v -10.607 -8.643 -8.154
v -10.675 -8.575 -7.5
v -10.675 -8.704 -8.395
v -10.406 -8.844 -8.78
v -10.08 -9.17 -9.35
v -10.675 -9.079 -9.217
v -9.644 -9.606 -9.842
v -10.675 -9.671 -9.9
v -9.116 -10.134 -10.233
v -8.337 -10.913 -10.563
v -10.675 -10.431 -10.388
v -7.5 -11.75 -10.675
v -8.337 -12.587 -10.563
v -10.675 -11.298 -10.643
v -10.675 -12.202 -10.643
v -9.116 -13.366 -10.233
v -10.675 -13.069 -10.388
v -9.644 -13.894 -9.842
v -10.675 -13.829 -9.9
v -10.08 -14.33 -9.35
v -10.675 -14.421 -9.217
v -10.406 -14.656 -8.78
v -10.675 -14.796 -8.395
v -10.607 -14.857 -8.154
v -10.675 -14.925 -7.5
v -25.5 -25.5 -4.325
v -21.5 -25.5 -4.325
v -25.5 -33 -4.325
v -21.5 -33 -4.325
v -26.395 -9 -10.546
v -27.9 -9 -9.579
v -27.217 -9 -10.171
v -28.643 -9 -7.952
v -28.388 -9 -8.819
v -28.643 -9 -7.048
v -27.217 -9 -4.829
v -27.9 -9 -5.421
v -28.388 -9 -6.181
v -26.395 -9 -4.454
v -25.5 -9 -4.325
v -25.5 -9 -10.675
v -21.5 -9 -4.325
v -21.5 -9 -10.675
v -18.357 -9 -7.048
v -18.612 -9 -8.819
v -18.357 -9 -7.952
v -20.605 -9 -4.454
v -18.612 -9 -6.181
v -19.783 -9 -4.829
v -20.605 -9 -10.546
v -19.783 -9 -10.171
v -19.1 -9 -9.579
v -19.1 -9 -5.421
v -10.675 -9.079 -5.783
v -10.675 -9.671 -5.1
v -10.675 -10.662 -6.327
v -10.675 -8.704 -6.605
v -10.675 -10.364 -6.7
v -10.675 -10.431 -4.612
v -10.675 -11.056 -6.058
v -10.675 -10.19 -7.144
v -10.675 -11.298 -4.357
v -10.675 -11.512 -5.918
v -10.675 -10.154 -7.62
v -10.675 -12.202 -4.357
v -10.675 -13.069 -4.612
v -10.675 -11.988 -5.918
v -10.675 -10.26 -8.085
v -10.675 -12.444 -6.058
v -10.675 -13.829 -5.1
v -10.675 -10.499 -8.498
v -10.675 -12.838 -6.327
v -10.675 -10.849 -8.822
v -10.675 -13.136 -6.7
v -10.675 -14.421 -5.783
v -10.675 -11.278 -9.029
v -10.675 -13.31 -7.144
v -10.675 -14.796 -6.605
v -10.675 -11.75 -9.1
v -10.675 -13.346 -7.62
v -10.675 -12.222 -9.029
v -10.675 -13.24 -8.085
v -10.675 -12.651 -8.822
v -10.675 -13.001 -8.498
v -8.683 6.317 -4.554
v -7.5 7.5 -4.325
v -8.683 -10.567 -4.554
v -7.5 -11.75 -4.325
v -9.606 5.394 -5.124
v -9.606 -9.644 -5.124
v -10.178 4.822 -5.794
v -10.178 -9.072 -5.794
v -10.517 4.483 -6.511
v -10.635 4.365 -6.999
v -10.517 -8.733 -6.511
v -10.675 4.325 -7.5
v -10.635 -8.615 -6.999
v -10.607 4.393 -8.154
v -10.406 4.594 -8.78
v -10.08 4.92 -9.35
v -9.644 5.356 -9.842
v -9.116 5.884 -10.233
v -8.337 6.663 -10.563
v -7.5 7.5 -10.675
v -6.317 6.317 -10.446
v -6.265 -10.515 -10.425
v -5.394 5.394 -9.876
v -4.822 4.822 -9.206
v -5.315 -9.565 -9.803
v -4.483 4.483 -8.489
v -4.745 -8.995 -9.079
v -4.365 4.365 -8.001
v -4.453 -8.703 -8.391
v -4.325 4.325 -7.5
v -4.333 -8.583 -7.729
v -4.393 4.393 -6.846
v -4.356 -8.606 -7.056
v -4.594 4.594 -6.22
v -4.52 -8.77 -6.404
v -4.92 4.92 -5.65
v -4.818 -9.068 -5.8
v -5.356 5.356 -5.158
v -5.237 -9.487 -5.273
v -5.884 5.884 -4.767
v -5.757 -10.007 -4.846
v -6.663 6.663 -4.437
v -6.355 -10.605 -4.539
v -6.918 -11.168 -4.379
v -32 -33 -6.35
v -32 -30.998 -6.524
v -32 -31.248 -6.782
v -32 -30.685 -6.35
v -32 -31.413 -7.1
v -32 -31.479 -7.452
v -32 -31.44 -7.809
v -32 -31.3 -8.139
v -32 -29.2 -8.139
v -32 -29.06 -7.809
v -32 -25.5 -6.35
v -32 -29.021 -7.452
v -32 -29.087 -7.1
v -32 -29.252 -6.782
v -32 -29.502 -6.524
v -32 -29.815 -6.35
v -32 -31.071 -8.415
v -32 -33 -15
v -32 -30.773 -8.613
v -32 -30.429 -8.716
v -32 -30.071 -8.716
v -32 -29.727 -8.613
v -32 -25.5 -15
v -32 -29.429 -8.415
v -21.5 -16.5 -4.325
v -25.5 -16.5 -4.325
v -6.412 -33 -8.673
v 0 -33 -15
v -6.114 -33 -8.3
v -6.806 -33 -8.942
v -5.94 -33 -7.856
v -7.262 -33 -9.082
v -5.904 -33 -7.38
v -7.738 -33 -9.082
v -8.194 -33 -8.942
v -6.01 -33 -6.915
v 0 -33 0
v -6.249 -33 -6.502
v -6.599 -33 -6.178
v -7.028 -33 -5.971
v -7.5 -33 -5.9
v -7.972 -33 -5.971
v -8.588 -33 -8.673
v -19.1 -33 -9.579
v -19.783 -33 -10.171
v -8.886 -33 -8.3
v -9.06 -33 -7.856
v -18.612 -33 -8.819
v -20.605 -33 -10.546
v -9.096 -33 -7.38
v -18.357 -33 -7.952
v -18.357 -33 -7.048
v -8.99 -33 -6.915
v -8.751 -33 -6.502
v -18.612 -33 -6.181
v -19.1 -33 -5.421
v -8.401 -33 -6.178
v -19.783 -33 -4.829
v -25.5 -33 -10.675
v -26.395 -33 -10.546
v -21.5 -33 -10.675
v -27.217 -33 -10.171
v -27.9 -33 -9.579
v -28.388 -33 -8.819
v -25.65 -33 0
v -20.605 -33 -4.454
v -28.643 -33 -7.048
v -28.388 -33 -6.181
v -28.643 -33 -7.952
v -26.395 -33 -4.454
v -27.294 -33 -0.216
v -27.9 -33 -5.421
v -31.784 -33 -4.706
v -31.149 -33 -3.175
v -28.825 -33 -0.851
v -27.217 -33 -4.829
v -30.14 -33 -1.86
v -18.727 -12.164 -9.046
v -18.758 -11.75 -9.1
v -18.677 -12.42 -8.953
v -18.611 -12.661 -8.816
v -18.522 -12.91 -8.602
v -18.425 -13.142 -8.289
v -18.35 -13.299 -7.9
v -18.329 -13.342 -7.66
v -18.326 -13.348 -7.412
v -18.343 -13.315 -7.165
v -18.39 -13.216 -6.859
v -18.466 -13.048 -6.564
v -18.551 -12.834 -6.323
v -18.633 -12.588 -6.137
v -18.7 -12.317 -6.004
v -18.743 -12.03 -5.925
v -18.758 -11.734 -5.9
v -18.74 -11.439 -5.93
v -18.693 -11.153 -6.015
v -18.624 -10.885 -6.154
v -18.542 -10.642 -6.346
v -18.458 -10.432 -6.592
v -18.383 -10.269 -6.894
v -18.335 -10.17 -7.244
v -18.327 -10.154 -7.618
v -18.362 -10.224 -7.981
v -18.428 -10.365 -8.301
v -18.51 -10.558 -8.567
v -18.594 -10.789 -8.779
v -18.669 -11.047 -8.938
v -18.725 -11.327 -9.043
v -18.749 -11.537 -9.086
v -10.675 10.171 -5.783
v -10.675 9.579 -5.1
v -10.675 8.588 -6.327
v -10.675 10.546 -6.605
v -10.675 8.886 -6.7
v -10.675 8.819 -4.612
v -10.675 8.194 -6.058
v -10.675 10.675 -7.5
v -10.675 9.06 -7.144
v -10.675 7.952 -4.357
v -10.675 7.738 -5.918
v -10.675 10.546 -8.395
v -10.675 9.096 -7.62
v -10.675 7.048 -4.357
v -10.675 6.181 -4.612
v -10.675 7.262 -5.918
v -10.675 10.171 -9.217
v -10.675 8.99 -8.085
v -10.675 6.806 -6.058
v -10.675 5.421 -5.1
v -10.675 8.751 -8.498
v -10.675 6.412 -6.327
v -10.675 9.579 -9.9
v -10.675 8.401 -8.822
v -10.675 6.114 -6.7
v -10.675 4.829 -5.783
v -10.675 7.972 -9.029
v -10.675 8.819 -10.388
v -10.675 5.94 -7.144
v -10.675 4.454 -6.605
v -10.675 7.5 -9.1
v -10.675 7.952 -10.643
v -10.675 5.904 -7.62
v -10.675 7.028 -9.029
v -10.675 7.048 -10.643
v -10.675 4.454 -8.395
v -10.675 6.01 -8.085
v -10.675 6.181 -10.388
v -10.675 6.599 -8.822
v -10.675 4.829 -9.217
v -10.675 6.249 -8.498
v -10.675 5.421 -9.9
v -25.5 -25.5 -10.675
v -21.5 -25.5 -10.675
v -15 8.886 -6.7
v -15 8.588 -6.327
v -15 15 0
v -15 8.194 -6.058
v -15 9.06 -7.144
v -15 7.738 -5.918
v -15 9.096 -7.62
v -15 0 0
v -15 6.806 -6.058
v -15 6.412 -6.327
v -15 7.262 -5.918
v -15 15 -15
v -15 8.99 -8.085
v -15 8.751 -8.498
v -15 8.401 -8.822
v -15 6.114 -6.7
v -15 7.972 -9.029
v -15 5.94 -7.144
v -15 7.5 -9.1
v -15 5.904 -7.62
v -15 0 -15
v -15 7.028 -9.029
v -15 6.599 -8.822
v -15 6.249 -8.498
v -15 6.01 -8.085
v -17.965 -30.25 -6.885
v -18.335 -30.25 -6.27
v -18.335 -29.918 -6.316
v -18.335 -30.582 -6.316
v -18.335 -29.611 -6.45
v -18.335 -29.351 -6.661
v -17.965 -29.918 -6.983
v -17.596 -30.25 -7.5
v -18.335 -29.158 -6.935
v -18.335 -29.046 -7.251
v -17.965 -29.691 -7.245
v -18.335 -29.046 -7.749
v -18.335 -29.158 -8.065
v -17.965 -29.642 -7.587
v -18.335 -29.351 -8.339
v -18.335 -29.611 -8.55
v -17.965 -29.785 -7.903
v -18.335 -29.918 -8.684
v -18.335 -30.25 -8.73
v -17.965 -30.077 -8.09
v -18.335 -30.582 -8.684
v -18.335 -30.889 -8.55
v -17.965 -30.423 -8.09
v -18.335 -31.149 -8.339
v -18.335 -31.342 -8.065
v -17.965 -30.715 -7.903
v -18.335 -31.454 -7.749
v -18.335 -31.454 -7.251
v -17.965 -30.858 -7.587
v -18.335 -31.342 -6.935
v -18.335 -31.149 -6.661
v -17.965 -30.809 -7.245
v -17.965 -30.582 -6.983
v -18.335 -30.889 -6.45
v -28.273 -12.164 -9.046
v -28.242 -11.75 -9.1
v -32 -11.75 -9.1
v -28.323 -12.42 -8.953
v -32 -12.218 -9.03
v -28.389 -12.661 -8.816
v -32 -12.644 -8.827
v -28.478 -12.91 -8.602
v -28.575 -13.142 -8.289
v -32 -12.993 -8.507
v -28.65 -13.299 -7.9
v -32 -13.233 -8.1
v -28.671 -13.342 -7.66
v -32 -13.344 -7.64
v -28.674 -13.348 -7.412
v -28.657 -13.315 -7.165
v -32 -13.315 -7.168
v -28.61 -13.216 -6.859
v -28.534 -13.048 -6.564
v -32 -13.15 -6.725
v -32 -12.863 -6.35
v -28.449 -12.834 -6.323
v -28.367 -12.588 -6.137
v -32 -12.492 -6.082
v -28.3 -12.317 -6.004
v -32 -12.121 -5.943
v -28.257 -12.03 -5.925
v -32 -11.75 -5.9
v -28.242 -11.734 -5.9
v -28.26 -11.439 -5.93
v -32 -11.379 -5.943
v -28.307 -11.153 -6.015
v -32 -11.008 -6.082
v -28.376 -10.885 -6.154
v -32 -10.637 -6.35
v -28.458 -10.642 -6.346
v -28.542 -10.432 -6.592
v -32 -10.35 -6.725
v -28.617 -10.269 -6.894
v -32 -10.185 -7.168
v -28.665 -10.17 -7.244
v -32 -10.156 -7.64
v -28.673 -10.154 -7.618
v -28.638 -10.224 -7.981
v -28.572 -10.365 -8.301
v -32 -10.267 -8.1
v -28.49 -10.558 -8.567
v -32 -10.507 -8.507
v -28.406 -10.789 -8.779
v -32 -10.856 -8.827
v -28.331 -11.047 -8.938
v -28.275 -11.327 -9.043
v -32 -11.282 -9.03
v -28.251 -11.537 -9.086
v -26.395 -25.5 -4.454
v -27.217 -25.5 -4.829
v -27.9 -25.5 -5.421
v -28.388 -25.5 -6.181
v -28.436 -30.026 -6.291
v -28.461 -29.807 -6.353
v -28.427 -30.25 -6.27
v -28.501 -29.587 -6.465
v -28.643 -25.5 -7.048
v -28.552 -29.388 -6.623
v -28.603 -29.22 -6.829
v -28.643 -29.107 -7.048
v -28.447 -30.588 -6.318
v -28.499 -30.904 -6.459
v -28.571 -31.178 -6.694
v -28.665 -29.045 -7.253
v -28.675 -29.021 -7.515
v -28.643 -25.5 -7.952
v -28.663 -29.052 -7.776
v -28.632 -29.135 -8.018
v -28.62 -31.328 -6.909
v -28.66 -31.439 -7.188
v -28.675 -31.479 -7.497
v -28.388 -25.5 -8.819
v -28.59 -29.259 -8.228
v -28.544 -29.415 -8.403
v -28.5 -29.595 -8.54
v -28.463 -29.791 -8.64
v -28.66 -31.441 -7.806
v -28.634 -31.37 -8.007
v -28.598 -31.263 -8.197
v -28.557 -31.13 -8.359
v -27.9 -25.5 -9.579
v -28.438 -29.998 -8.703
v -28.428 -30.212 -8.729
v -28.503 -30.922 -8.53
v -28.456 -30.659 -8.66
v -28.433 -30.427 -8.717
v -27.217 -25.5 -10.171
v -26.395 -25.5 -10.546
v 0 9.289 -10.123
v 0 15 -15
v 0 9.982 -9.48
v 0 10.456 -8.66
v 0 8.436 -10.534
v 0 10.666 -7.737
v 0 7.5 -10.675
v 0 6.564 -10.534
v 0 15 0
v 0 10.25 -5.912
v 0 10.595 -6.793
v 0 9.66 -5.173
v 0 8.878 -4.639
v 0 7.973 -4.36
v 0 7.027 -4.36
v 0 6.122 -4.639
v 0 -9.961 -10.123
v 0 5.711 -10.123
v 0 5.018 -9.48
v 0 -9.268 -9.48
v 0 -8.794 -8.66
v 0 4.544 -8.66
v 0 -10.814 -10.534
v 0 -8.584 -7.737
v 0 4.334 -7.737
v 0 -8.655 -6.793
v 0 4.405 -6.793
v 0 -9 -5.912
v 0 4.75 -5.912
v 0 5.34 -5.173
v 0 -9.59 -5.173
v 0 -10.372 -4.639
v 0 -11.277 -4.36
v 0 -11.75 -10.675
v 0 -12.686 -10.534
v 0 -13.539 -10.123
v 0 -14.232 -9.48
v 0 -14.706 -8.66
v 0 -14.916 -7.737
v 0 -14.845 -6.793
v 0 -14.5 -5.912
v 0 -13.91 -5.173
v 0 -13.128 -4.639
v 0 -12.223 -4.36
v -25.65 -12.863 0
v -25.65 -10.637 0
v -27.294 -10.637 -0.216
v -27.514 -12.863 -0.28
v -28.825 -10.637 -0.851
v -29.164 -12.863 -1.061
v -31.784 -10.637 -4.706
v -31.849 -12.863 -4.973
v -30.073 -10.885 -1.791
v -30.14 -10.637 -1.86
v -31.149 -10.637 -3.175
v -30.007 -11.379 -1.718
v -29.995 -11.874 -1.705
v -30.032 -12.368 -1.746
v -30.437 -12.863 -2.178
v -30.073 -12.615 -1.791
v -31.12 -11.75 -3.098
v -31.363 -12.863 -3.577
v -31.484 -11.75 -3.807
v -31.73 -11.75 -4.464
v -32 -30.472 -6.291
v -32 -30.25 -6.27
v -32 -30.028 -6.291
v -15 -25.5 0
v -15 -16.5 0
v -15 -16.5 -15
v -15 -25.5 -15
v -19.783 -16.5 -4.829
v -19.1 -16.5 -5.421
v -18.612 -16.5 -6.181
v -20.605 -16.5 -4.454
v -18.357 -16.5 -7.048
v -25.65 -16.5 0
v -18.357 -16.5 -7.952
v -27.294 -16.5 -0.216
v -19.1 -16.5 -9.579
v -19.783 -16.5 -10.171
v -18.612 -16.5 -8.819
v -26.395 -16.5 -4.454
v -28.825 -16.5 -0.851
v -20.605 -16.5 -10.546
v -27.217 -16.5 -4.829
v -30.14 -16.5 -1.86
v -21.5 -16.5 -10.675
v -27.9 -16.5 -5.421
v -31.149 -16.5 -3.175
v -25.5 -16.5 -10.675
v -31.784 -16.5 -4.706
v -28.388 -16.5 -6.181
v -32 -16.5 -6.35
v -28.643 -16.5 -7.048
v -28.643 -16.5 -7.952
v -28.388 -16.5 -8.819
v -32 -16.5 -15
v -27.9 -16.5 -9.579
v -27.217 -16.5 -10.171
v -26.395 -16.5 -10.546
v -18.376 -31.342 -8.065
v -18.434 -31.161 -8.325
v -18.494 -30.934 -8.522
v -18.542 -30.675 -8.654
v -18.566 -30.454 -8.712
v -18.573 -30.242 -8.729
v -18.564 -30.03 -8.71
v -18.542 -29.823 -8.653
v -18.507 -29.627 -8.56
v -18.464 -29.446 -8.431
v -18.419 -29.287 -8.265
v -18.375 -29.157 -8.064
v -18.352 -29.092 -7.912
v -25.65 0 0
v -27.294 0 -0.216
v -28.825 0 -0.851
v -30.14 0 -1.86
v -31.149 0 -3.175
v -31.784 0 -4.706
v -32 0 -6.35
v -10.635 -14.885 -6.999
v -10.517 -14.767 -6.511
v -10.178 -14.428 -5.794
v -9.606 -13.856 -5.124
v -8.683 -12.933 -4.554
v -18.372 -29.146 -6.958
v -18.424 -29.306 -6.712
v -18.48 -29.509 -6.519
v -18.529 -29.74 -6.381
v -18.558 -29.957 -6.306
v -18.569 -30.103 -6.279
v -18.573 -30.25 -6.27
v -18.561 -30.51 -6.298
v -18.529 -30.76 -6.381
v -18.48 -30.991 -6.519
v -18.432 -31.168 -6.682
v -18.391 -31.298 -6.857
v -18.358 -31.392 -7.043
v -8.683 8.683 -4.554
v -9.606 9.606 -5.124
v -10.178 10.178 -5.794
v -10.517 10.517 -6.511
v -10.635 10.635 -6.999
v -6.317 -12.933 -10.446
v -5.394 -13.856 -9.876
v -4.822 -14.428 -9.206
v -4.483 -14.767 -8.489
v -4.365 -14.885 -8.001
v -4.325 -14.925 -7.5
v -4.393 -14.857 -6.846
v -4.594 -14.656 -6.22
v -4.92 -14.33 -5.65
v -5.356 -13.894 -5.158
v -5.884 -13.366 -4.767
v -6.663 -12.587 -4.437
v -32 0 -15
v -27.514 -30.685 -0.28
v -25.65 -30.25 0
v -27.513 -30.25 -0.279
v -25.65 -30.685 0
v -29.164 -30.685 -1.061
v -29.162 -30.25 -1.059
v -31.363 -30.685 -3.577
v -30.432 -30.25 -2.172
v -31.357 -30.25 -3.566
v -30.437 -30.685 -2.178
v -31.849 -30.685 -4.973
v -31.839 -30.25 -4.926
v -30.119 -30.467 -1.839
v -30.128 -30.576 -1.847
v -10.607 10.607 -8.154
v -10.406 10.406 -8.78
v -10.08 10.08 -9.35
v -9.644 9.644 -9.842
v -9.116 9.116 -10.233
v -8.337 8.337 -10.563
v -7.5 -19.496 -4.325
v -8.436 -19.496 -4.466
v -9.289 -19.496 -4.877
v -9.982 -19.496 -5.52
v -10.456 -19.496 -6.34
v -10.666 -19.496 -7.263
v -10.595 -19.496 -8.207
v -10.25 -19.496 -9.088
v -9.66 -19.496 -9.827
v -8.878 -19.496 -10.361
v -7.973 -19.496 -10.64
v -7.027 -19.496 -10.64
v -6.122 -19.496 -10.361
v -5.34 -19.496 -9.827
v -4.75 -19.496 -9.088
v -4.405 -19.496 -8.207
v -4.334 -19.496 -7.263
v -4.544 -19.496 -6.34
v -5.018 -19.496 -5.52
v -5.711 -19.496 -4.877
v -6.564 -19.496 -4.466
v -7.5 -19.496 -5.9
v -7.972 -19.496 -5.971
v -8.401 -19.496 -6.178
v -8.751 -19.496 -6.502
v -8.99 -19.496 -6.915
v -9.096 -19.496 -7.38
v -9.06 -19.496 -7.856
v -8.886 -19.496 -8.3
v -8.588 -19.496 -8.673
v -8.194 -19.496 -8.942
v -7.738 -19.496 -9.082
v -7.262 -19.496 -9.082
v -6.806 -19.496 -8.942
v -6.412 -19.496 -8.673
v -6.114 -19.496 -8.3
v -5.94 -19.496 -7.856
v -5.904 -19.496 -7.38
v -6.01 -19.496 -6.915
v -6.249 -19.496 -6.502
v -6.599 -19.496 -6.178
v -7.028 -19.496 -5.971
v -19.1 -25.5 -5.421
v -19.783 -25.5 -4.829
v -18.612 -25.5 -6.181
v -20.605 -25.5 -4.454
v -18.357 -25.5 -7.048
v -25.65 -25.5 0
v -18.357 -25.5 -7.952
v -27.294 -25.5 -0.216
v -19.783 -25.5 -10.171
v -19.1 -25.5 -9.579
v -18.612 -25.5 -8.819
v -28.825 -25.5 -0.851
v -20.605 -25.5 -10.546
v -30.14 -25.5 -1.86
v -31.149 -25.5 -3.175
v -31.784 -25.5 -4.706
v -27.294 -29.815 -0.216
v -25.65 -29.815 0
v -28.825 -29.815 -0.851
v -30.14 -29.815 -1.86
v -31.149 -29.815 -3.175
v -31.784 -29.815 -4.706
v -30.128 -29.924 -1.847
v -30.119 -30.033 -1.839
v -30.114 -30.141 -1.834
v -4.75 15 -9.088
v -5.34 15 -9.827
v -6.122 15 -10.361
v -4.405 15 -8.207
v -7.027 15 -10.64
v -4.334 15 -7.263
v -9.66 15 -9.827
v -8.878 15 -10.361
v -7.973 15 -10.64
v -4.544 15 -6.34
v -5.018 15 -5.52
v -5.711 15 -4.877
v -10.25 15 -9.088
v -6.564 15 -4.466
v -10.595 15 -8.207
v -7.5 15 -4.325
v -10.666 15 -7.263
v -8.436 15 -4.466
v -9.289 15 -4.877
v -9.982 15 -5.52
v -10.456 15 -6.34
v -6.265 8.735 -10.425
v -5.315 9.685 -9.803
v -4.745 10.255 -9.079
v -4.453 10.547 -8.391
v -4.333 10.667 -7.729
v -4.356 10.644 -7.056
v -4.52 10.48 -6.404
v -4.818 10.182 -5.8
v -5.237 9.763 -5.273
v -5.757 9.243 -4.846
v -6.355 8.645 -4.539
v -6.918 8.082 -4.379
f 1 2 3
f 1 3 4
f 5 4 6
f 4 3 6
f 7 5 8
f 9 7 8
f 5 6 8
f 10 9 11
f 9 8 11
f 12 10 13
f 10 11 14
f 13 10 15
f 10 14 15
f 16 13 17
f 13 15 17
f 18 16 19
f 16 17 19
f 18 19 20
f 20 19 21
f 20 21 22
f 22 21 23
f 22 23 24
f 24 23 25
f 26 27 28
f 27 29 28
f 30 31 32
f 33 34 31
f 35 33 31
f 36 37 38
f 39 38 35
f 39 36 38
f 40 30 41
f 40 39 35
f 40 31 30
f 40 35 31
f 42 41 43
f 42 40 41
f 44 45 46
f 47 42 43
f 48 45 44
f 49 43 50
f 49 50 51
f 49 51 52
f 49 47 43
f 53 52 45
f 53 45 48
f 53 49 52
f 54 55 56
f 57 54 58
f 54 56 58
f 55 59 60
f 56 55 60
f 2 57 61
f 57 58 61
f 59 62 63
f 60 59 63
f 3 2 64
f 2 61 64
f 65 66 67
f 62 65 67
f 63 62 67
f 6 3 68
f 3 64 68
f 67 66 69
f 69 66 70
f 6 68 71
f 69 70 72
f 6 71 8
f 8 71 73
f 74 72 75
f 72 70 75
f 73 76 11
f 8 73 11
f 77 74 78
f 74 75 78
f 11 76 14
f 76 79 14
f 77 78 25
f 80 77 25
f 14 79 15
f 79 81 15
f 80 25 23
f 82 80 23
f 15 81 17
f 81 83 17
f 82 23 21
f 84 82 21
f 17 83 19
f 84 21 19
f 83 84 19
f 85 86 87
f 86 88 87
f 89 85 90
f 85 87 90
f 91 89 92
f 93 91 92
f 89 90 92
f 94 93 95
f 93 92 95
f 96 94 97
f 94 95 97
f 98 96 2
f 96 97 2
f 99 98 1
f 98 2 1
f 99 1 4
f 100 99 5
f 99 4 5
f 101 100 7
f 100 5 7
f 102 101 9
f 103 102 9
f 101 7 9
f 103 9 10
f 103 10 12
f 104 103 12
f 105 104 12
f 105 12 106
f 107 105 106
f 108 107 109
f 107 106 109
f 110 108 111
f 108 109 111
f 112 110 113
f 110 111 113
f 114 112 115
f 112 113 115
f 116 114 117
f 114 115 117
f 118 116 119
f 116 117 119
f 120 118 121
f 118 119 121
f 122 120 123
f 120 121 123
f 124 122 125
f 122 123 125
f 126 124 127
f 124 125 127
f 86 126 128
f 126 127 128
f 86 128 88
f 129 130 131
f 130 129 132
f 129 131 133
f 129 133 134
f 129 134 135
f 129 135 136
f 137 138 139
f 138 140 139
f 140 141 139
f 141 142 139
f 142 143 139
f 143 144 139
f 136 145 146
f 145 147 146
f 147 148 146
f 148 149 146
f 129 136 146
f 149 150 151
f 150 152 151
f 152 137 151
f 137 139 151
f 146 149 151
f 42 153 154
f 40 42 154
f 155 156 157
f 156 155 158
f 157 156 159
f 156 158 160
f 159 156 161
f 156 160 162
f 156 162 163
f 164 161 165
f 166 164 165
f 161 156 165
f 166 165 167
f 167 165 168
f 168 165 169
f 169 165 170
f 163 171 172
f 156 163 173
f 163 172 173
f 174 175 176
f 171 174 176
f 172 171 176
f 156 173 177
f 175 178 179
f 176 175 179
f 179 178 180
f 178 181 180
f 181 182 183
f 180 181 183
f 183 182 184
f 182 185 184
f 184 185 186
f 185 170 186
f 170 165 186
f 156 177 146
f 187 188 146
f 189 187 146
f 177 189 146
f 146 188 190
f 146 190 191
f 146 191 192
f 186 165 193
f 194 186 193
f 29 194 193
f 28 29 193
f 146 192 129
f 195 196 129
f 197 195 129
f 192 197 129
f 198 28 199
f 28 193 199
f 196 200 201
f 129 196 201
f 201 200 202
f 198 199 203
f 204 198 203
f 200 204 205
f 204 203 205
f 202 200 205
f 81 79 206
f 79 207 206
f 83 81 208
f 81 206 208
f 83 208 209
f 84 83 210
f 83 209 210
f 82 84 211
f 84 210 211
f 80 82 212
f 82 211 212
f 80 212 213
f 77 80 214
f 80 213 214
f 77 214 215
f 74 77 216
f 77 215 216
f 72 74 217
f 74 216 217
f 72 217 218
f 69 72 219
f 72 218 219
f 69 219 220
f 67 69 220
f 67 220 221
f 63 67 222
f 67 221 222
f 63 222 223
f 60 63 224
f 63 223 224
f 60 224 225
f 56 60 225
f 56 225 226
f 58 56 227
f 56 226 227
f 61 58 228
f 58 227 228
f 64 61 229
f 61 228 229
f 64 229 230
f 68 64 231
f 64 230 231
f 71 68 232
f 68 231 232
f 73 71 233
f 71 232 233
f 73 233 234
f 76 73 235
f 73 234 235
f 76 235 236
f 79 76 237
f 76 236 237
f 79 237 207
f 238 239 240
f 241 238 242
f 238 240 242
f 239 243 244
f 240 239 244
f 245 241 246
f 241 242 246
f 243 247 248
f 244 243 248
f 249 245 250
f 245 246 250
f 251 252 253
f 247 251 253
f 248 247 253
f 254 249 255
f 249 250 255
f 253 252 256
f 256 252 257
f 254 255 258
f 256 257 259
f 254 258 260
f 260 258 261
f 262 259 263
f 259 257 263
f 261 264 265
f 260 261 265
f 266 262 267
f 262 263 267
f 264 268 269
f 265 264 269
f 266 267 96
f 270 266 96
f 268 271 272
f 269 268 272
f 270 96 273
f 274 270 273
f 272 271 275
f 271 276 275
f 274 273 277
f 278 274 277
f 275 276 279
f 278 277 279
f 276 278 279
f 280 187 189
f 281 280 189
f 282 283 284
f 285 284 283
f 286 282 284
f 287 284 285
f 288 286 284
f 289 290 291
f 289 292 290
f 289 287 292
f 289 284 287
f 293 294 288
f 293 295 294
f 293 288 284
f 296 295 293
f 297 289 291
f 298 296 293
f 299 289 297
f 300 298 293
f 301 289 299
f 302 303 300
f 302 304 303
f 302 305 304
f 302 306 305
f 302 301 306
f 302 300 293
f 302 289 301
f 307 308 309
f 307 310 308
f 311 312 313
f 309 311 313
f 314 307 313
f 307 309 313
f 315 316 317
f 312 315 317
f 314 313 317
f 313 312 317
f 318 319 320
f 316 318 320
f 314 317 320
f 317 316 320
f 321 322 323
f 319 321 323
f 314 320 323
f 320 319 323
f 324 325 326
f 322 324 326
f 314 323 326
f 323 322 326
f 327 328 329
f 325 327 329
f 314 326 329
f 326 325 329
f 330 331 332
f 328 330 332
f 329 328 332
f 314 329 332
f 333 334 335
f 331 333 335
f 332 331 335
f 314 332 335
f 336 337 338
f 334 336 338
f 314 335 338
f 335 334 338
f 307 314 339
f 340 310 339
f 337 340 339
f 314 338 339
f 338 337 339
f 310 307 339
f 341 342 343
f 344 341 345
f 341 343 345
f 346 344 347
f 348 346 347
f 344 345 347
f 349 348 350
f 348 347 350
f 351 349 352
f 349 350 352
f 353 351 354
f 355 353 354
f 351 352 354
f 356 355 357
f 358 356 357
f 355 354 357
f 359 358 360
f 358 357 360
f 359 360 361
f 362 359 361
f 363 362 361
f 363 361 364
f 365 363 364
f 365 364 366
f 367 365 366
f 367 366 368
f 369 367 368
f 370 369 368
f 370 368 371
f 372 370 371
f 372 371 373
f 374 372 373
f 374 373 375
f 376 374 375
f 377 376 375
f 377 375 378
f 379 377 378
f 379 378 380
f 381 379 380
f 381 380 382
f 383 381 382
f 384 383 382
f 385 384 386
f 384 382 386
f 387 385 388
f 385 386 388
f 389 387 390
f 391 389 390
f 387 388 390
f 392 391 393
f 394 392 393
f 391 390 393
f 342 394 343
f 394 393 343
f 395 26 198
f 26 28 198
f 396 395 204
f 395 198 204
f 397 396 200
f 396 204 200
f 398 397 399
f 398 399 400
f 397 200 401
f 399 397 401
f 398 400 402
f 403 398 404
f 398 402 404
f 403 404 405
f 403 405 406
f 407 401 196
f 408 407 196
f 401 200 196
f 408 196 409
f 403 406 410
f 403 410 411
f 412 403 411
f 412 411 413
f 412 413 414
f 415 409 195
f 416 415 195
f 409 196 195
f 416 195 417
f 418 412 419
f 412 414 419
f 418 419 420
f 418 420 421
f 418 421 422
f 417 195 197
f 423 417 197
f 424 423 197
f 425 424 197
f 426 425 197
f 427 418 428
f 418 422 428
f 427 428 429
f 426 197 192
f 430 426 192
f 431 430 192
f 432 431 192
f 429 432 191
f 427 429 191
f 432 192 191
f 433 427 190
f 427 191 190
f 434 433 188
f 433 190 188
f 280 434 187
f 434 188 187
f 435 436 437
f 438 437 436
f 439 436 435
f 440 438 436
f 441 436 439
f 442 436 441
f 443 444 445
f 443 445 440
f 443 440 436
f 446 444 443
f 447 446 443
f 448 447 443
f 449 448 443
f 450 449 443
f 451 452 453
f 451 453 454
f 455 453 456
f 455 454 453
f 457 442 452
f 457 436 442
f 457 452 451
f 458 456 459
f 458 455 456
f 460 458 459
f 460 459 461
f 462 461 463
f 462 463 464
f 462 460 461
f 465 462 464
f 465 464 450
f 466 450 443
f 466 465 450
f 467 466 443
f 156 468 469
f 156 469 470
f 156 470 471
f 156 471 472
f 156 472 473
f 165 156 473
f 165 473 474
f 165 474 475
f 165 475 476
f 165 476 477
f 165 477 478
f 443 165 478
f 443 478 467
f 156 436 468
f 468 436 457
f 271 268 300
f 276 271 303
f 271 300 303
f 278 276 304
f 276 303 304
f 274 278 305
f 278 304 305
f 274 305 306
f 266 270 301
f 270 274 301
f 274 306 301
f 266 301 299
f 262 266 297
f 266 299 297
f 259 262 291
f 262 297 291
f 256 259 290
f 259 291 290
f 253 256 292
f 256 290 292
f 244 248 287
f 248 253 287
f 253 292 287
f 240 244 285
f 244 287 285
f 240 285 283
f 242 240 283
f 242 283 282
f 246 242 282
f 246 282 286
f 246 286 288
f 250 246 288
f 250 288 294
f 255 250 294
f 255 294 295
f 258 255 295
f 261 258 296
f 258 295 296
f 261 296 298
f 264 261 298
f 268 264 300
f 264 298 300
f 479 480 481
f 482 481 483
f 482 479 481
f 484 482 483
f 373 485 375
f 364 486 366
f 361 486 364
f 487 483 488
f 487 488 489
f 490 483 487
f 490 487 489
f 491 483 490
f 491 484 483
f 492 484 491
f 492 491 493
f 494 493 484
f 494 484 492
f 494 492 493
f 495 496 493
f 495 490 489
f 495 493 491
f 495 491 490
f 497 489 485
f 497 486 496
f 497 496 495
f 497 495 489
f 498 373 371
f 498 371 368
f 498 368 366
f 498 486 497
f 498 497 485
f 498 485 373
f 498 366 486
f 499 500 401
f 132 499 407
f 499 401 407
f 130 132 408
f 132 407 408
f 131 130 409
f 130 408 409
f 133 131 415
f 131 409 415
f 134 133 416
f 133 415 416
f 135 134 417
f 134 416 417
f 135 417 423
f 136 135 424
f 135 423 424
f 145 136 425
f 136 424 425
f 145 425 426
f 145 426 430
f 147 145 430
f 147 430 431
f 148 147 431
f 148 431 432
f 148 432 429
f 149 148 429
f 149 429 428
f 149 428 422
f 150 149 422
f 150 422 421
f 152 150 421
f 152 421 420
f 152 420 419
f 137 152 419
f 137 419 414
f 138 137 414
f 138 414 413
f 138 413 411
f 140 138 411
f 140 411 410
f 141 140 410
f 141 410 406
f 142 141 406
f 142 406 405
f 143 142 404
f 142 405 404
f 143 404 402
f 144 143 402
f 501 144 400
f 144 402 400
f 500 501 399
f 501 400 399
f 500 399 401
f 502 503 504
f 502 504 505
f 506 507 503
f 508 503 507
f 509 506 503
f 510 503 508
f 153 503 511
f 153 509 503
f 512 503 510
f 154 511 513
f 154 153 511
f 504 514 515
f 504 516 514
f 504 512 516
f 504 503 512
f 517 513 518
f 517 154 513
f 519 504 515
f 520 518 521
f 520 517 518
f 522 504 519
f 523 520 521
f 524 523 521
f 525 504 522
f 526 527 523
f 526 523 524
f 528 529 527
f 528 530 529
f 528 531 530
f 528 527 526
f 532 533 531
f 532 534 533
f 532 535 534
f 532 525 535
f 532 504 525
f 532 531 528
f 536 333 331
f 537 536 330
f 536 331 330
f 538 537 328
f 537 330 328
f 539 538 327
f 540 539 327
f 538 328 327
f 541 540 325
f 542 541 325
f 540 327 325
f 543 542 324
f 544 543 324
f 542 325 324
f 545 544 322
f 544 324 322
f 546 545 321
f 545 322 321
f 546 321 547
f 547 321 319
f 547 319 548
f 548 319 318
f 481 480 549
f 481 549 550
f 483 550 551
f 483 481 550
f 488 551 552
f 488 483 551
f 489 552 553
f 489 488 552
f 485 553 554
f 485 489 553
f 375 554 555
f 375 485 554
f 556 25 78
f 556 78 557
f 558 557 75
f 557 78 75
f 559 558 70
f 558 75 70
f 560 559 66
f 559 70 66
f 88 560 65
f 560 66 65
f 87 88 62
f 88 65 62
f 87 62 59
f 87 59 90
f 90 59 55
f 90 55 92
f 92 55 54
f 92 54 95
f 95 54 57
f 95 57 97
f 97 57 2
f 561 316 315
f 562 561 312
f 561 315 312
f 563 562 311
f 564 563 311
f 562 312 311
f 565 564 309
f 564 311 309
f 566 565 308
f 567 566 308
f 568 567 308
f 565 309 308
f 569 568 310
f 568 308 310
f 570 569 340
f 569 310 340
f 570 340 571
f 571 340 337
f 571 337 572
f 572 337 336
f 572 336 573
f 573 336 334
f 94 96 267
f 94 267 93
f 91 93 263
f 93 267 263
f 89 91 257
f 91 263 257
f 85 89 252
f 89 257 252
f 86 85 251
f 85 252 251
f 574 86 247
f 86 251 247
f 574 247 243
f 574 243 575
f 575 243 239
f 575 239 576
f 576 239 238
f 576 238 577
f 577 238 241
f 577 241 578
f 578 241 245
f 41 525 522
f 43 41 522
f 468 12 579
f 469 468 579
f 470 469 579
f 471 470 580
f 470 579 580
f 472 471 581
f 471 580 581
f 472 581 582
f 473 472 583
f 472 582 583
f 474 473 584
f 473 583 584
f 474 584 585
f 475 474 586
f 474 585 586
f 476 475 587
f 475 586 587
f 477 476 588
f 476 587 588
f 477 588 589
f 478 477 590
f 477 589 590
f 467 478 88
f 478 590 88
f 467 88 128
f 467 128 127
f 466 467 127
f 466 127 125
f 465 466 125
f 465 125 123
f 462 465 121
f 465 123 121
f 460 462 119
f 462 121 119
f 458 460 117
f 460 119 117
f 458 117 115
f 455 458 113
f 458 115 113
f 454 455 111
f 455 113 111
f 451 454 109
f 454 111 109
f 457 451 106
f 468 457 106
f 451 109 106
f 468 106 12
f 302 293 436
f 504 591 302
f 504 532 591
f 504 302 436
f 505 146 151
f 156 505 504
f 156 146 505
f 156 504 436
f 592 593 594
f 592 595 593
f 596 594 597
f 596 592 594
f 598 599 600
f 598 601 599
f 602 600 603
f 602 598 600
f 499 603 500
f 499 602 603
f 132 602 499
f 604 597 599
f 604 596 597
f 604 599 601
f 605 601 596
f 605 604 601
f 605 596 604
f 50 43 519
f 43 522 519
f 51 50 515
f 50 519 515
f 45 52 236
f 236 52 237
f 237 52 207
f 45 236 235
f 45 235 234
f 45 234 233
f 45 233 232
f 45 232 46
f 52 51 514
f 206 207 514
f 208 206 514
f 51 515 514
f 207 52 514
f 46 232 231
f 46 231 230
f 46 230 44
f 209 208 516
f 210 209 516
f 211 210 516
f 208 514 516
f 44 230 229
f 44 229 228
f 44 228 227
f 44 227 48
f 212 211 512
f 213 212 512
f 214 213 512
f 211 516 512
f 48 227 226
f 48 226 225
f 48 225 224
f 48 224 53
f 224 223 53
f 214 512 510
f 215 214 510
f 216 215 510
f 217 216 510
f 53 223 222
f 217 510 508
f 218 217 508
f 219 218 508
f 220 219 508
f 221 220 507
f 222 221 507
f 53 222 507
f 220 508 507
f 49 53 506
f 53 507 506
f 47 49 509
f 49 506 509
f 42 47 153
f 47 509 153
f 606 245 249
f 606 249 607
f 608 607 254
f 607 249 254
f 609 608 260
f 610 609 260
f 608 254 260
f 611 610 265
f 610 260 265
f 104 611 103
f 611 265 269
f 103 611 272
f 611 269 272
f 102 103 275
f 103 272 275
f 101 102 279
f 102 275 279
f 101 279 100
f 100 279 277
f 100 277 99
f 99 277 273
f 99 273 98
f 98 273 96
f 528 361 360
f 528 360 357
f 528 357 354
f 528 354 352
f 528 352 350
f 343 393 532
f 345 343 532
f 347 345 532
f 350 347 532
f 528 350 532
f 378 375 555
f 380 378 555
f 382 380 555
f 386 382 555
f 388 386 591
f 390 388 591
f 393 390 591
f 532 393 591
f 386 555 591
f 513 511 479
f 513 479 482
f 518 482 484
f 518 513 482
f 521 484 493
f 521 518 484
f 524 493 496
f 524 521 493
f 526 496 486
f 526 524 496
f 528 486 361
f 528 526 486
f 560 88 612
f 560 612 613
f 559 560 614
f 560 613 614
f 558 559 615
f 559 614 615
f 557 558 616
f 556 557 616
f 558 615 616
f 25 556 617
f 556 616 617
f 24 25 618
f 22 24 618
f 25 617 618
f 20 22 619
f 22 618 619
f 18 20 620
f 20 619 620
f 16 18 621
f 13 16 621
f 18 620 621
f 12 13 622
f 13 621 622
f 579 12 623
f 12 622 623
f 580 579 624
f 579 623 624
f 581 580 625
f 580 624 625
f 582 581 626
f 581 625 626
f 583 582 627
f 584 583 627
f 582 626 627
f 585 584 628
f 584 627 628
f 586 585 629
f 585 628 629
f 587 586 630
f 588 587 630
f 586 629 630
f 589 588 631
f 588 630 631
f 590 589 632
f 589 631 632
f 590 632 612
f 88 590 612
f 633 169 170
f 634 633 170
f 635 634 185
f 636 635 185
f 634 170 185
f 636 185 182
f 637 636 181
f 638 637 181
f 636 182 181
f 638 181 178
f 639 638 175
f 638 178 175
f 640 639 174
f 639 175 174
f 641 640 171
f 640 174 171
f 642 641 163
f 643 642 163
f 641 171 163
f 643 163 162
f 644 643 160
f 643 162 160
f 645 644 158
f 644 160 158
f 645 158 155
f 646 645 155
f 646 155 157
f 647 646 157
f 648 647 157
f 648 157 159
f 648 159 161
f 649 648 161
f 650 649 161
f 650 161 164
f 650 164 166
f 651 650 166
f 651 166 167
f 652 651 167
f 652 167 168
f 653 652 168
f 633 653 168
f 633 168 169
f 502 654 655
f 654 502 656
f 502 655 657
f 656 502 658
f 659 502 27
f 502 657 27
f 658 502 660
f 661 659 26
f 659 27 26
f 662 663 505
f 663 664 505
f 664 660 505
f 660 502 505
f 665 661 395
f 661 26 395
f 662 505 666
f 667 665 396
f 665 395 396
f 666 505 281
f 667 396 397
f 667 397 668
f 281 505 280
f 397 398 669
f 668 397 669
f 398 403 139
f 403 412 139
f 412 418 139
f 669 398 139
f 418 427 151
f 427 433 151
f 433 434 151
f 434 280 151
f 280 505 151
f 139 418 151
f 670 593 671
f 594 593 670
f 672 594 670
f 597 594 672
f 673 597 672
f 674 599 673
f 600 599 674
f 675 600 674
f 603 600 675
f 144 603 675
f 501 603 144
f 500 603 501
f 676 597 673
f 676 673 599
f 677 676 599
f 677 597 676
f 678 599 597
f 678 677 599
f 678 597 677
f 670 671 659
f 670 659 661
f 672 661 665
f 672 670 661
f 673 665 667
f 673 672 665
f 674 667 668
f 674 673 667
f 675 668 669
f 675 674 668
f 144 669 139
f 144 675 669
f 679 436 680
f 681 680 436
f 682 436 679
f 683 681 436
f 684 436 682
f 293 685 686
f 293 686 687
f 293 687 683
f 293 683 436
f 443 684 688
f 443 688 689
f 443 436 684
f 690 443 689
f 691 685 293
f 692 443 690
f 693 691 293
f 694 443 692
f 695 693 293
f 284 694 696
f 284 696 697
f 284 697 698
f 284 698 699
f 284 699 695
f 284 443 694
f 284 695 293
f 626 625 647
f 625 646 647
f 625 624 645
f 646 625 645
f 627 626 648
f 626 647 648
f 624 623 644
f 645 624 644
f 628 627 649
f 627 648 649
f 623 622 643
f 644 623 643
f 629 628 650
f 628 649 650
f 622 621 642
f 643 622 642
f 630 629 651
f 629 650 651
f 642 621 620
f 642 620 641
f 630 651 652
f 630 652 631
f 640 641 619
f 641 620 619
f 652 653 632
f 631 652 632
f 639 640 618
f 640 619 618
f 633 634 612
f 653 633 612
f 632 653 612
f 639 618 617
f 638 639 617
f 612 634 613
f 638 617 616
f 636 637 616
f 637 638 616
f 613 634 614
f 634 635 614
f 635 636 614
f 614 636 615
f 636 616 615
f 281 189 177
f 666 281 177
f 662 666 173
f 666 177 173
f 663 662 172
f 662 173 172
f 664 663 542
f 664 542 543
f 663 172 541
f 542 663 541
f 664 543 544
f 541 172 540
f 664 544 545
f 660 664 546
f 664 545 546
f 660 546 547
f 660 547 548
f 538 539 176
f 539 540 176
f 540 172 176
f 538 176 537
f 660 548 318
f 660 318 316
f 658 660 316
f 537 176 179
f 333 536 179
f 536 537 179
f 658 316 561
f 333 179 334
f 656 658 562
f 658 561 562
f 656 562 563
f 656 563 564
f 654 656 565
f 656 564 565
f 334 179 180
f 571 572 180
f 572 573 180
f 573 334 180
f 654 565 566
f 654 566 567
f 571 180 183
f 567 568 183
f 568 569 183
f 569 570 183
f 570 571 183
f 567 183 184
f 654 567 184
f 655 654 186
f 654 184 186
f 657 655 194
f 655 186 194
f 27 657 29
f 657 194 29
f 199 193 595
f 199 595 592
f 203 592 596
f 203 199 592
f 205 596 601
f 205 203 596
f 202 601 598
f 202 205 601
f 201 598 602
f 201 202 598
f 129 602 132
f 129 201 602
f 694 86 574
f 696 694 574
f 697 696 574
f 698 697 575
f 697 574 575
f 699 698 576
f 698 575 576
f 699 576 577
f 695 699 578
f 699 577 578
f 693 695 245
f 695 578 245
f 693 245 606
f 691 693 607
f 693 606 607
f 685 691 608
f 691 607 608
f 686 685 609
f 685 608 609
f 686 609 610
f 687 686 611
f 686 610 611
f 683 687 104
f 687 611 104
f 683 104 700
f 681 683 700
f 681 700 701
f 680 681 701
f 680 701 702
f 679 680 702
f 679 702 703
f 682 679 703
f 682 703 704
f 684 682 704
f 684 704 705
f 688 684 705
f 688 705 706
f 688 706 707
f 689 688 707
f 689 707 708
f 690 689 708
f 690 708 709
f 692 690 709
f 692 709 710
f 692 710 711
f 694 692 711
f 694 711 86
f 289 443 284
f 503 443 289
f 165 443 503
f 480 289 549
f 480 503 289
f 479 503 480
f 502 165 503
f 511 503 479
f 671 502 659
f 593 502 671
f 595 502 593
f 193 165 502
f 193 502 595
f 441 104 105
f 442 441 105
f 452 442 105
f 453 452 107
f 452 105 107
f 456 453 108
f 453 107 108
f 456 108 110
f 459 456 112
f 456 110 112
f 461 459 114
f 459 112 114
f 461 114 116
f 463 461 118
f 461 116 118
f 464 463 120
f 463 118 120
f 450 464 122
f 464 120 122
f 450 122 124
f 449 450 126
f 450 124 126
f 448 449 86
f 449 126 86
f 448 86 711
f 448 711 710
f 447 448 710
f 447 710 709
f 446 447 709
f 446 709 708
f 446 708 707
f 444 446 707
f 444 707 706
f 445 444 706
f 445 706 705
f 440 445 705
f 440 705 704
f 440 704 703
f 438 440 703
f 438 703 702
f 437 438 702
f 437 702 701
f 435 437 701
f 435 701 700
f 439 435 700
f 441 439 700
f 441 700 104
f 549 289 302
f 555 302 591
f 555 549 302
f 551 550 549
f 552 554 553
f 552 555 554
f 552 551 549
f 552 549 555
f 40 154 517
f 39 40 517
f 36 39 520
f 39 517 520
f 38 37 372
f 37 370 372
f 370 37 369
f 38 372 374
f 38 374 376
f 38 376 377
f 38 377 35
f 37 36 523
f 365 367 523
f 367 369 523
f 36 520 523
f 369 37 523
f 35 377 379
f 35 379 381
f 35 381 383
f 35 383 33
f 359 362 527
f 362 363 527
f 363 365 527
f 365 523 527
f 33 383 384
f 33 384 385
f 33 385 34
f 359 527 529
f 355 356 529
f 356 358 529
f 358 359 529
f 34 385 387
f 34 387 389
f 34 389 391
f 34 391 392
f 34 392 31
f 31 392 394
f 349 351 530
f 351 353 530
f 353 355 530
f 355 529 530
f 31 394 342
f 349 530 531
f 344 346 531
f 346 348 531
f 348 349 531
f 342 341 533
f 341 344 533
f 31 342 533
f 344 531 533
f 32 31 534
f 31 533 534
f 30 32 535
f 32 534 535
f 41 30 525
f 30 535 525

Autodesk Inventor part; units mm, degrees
ref_plane "YZ Plane" through (0, 0, 0) normal (1, 0, 0) x (0, 1, 0)
ref_plane "XZ Plane" through (0, 0, 0) normal (0, 1, 0) x (-1, 0, 0)
ref_plane "XY Plane" through (0, 0, 0) normal (0, 0, 1) x (1, 0, 0)
sketch "Base Profile" plane through (0, 0, 0) normal (0, 1, 0) x (-1, 0, 0)
  line L0 (0, 0) -> (15, 0)
  line L1 (15, 0) -> (15, -15)
  line L2 (15, -15) -> (0, -15)
  line L3 (0, -15) -> (0, 0)
  line L4 (15, 0) -> (32, 0)
  line L5 (32, 0) -> (32, -15)
  line L6 (32, -15) -> (15, -15)
  line L7 (15, -15) -> (15, 0)
  dimension "d164" = 15
  dimension "d165" = 15
  dimension "d166" = 17
  dimension "d167" = 15
extrude "Stock" add sketch "Base Profile" against normal blind 33
extrude "Extrusion Post" add sketch "Base Profile" along normal blind 15 contours L0 L1 L2 L3
sketch "Sketch27" plane through (0, -33, -15) normal (0, 0, -1) x (-1, 0, 0)
  line L0 (0, 0) -> (0, 48) projected
  line L1 (32, 0) -> (0, 0) projected
  line L2 (32, 33) -> (32, 0) projected
  line L3 (15, 33) -> (32, 33) projected
  line L4 (15, 33) -> (15, 48) projected
  line L5 (0, 48) -> (15, 48) projected
  line L6 (0, 16.5) -> (32, 16.5)
  line L7 (0, 7.5) -> (32, 7.5)
  line L8 (15, 33) -> (15, 0)
  point P0 (15, 16.5)
  point P1 (15, 7.5)
  dimension "d247" = 16.5
  dimension "d290" = 7.5
extrude "Lower Half Cut" cut sketch "Sketch27" against normal through all contours L8 L6 L2 L7
sketch "Bottom Profile" plane through (-35, -33, -15) normal (0, -1, 0) x (1, 0, 0)
  line L0 (13.5, 7.5) -> (9.5, 7.5) construction
  line L1 (13.5, 10.675) -> (9.5, 10.675)
  line L2 (9.5, 4.325) -> (13.5, 4.325)
  arc A0 (13.5, 4.325) -> (13.5, 10.675) centre (13.5, 7.5) ccw
  arc A1 (9.5, 10.675) -> (9.5, 4.325) centre (9.5, 7.5) ccw
  line L3 (3, 15) -> (3, 0) projected
  line L4 (35, 15) -> (3, 15) projected
  point P0 (11.5, 7.5)
  dimension "d291" = 4
  dimension "d292" = 6.35
  dimension "d293" = 6.5
  dimension "d294" = 7.5
extrude "Slot Cut" cut sketch "Bottom Profile" against normal blind 24
sketch "Front Hole Pattern" plane through (0, -33, 0) normal (1, 0, 0) x (0, 0, -1)
  line L0 (0, 0) -> (0, 48) projected
  circle A0 centre (7.5, 40.5) radius 3.175
  line L1 (0, 48) -> (15, 48) projected
  circle A1 centre (7.5, 21.25) radius 3.175
  line L2 (15, 0) -> (0, 0) projected
  dimension "d317" = 6.35
  dimension "d318" = 7.5
  dimension "d319" = 7.5
  dimension "d354" = 6.35
  dimension "d356" = 21.25
sketch "Sketch33" plane through (0, 15, 0) normal (0, 1, 0) x (1, 0, 0)
  line L0 (-15, 15) -> (-15, 0) projected
  line L1 (-15, 0) -> (0, 0) projected
  line L2 (0, 0) -> (0, 15) projected
  line L3 (0, 15) -> (-15, 15) projected
  circle A0 centre (-7.5, 7.5) radius 3.175
  dimension "d340" = 6.35
  dimension "d341" = 7.5
  dimension "d342" = 7.5
hole "Top Mounting Hole" at (-7.5, 15, -7.5) direction (0, -1, 0) diameter 3.2004 end through all counterbore diameter 6.35 counterbore depth 34.496 clearance for "Socket Head Cap Screw" size "M3" standard "Ansi Metric M Profile"
sketch "Rear Hole Patttern" plane through (-32, -33, -15) normal (-1, 0, 0) x (0, 0, 1)
  line L0 (15, 7.5) -> (0, 7.5) projected
  line L1 (0, 7.5) -> (0, 0) projected
  line L2 (15, 0) -> (0, 0) projected
  line L3 (15, 7.5) -> (15, 0) projected
  circle A0 centre (7.5, 2.75) radius 1.5
  line L4 (0, 16.5) -> (15, 16.5) projected
  line L5 (15, 33) -> (15, 16.5) projected
  line L6 (0, 33) -> (15, 33) projected
  line L7 (0, 33) -> (0, 16.5) projected
  circle A1 centre (7.5, 21.25) radius 1.5
  dimension "d330" = 3
  dimension "d331" = 7.5
  dimension "d352" = 3
  dimension "d358" = 2.75
  dimension "d359" = 4.75
hole "Adjustment Holes" at (-32, -30.25, -7.5) direction (1, 0, 0) diameter 2.459 depth 13.6652 tip angle 118 thread size "M3x0.5" class "6H" standard "ANSI Metric M Profile"
hole "Front Adjustment Hole" at (0, -11.75, -7.5) direction (-1, 0, 0) diameter 3.2004 end through all counterbore diameter 6.35 counterbore depth 10.675 clearance for "Socket Head Cap Screw" size "M3" standard "Ansi Metric M Profile"
hole "Front Mounting Hole" at (0, 7.5, -7.5) direction (-1, 0, 0) diameter 3.2004 end through all counterbore diameter 6.35 counterbore depth 10.675 clearance for "Socket Head Cap Screw" size "M3" standard "Ansi Metric M Profile"
fillet "Fillet2" radius 6.35 2 edges at (-32, -29.25, 0) (-32, -8.25, 0)
equation "\"d164\" = extrusionWidth"
equation "\"d165\" = extrusionWidth"
equation "\"d166\" = idlerLength"
equation "\"d167\" = d165"
equation "\"d168\" = extrusionOffset"
equation "\"extrusionWidth\" = 15"
equation "\"idlerLength\" = 17"
equation "\"bearingOffsetFromBottom\" = 7.5"
equation "\"extrusionOffset\" = 33"
equation "\"bearingStackHeight\" = 9"
equation "\"bearingSlotLength\" = 4"
equation "\"bearingClearance\" = 13"
equation "\"pinSupportLength\" = 2"
properties part number "A Idler" material "Aluminum 6061"
